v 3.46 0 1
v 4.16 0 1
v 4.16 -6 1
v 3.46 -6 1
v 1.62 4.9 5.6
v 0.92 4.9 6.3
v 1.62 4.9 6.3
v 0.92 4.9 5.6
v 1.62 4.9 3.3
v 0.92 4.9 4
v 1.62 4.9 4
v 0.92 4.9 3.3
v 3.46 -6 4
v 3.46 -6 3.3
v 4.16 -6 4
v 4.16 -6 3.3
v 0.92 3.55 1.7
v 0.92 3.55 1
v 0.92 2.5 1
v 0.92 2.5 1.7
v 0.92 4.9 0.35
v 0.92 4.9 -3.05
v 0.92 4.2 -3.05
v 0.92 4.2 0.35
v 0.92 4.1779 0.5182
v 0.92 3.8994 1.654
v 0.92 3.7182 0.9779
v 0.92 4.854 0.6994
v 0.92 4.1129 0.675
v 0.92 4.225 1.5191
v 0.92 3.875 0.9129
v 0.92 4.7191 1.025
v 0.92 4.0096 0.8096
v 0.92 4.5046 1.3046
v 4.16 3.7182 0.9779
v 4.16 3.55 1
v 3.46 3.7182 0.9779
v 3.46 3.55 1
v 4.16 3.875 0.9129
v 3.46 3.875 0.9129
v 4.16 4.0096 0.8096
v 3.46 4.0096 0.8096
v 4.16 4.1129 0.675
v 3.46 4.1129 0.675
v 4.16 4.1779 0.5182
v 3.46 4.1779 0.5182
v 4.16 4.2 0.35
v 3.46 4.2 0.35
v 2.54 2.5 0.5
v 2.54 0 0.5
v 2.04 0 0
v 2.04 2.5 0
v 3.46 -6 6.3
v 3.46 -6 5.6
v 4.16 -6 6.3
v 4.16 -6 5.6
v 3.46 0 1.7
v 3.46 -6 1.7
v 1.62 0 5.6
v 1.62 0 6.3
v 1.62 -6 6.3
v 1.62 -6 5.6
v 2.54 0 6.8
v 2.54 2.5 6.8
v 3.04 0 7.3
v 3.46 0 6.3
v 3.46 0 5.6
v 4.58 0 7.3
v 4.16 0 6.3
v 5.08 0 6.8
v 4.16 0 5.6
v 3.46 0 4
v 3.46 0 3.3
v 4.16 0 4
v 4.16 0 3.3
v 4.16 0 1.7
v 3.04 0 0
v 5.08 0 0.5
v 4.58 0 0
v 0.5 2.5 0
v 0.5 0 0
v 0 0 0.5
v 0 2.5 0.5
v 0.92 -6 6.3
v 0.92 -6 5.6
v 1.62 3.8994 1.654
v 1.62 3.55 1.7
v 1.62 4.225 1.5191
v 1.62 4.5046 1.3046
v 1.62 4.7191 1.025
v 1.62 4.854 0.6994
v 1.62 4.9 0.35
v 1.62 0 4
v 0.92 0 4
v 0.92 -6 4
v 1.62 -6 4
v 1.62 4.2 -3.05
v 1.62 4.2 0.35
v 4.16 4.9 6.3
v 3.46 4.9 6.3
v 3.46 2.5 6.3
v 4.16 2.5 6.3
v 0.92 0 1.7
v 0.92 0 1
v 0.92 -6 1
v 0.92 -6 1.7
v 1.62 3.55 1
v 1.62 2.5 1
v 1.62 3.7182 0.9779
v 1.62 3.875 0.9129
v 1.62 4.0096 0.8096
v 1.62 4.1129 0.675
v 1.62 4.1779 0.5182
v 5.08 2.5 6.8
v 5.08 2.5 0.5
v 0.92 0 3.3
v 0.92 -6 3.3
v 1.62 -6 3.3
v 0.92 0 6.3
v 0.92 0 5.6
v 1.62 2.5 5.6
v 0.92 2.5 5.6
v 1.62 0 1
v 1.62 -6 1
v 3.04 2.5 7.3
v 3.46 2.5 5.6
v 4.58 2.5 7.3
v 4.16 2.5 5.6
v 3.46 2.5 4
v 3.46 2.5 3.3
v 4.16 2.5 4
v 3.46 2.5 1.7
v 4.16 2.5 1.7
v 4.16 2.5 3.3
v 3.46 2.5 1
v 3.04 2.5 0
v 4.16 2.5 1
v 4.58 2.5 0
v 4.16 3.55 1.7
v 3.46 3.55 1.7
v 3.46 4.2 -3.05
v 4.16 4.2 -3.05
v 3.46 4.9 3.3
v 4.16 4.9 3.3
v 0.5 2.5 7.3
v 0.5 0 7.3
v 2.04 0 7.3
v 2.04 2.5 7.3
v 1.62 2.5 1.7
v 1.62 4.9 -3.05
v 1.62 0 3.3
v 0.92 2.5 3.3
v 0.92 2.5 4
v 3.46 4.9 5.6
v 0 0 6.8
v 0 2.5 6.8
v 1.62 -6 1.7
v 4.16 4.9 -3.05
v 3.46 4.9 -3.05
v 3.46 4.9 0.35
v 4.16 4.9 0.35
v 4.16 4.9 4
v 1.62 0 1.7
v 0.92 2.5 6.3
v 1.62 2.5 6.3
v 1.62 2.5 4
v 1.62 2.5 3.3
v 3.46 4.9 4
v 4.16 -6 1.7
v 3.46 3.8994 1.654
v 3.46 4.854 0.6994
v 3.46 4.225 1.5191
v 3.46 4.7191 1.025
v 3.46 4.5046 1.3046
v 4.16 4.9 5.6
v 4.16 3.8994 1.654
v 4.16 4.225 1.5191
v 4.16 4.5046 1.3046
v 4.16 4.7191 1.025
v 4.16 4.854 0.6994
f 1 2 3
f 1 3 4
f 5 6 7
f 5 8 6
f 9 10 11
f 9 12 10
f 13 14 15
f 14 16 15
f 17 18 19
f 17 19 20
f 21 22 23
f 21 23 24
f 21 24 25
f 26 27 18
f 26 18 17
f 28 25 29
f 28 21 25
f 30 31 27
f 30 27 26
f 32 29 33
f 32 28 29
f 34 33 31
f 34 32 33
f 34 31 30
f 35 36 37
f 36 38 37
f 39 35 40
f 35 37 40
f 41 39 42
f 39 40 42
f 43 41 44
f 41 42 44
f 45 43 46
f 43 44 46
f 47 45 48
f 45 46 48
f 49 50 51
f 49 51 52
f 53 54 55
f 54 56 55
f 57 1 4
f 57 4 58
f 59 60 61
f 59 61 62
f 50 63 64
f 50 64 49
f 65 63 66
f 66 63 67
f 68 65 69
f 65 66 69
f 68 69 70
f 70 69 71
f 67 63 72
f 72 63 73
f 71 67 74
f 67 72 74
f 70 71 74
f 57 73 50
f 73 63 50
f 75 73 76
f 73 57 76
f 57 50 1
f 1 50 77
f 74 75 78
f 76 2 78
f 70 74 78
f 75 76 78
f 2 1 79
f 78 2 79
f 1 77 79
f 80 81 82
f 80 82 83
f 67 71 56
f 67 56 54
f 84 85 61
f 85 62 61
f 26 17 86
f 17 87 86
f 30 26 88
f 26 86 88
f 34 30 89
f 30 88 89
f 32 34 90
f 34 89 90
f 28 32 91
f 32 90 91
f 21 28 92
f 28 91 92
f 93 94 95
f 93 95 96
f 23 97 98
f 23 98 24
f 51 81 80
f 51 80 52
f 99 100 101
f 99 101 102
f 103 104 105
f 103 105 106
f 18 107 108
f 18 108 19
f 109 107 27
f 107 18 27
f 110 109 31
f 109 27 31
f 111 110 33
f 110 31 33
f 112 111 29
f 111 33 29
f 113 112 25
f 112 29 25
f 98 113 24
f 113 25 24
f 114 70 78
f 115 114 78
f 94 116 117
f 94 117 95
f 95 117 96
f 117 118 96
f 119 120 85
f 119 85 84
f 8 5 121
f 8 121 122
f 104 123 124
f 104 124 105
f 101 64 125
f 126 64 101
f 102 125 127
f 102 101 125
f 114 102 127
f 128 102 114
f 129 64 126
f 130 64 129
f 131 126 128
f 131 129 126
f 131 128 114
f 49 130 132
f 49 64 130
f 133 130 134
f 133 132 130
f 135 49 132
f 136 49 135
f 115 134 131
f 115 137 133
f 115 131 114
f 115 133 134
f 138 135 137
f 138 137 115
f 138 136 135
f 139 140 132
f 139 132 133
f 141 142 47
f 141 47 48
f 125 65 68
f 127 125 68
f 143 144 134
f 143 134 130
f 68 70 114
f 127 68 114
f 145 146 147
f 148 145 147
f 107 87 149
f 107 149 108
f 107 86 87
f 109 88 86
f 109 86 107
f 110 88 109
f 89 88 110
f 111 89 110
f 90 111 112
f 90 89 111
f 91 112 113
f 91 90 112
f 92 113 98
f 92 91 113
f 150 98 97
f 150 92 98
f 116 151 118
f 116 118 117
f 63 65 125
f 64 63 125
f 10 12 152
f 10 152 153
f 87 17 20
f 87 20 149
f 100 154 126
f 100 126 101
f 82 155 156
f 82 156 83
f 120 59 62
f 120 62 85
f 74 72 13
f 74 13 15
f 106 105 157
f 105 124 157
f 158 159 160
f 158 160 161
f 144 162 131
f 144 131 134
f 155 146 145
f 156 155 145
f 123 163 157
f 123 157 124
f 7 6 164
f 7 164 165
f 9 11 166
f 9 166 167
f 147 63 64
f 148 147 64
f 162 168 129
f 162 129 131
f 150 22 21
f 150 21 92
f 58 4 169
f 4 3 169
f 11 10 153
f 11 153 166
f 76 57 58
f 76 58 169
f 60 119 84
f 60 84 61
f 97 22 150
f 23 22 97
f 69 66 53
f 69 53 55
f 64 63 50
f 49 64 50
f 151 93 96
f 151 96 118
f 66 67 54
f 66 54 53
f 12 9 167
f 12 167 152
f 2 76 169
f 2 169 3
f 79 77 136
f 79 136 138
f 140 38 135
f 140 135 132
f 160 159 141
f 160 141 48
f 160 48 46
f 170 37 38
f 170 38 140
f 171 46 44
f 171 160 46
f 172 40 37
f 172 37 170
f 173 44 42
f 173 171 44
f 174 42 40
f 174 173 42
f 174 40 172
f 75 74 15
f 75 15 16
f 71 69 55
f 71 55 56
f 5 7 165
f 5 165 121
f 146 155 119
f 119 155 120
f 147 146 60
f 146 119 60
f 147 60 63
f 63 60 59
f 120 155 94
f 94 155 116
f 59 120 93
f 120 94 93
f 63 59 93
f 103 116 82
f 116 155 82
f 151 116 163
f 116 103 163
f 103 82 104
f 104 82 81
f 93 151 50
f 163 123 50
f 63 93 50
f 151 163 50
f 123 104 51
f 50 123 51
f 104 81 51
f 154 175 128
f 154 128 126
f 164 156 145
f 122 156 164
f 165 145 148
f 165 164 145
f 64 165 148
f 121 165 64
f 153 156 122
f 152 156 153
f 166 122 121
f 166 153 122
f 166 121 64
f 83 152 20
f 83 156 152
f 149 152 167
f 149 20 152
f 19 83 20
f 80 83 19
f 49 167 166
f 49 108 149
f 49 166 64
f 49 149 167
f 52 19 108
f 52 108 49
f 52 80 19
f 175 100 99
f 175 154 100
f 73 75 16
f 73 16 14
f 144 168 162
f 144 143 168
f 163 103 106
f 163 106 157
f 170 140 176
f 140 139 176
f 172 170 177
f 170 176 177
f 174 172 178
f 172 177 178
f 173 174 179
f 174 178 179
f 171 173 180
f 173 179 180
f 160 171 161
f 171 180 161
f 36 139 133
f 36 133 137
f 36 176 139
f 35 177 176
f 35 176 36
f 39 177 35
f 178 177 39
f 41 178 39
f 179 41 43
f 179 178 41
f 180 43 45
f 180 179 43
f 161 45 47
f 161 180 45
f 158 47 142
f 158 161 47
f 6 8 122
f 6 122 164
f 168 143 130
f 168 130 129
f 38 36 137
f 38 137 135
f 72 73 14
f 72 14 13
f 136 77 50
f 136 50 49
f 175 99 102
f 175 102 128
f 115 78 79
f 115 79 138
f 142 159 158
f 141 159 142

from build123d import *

# Parameters (mm, degrees)
SKETCH1_W           = 0.7
SKETCH1_H           = 0.7
SKETCH1_5_W         = 0.7
SKETCH1_5_H         = 0.7
SKETCH1_6_W         = 0.7
SKETCH1_6_H         = 0.7
SKETCH1_7_W         = 2.54
SKETCH1_7_H         = 7.3
SKETCH1_7_W_2       = 0.7
SKETCH1_7_H_2       = 0.7
BOSS_EXTRUDE1_DEPTH = 2.5
CHAMFER1_SIZE       = 0.5
LPATTERN1_COUNT     = 2
LPATTERN1_PITCH     = 2.54
SKETCH3_W           = 5.08
SKETCH3_H           = 10.35
CUT_EXTRUDE1_DEPTH  = 5.6


with BuildPart() as part:
    # Sweep3: sweep along a path in Sketch2
    with BuildLine(Plane(origin=(1.25, 0, 0), x_dir=(0, 0, -1), z_dir=(1, 0, 0))) as sweep3_path:
        Line((-5.95, -6), (-5.95, 8.15))
        ThreePointArc((-5.95, 8.15), (-5.657106781, 8.857106781), (-4.95, 9.15))
        Line((-4.95, 9.15), (3.05, 9.15))
    # Sketch1 → Sweep3 (sweep)
    with BuildSketch(Plane(origin=(0, 0, 0), x_dir=(1, 0, 0), z_dir=(0, 1, 0))):
        with Locations((1.27, -5.95)):
            Rectangle(SKETCH1_W, SKETCH1_H)
    sweep(path=sweep3_path.line)



with BuildPart() as body_2:
    # Sweep4: sweep along a path in Sketch2<6>
    with BuildLine(Plane(origin=(1.25, 0, 0), x_dir=(0, 0, -1), z_dir=(1, 0, 0))) as sweep4_path:
        Line((-3.65, -6), (-3.65, 5.85))
        ThreePointArc((-3.65, 5.85), (-3.357106781, 6.557106781), (-2.65, 6.85))
        Line((-2.65, 6.85), (3.05, 6.85))
    # Sketch1<5> → Sweep4 (sweep)
    with BuildSketch(Plane(origin=(0, 0, 0), x_dir=(1, 0, 0), z_dir=(0, 1, 0))):
        with Locations((1.27, -3.65)):
            Rectangle(SKETCH1_5_W, SKETCH1_5_H)
    sweep(path=sweep4_path.line)


with BuildPart() as body_3:
    # Sweep5: sweep along a path in Sketch2<7>
    with BuildLine(Plane(origin=(1.25, 0, 0), x_dir=(0, 0, -1), z_dir=(1, 0, 0))) as sweep5_path:
        Line((-1.35, -6), (-1.35, 3.55))
        ThreePointArc((-1.35, 3.55), (-1.057106781, 4.257106781), (-0.35, 4.55))
        Line((-0.35, 4.55), (3.05, 4.55))
    # Sketch1<6> → Sweep5 (sweep)
    with BuildSketch(Plane(origin=(0, 0, 0), x_dir=(1, 0, 0), z_dir=(0, 1, 0))):
        with Locations((1.27, -1.35)):
            Rectangle(SKETCH1_6_W, SKETCH1_6_H)
    sweep(path=sweep5_path.line)


with BuildPart() as part_1:
    add(part.part)

    add(body_2.part)  # Boss-Extrude1 merges body 2

    add(body_3.part)  # Boss-Extrude1 merges body 3
    # Sketch1<7> → Boss-Extrude1 (add)
    with BuildSketch(Plane(origin=(0, 0, 0), x_dir=(1, 0, 0), z_dir=(0, 1, 0))):
        with Locations((1.27, -3.65)):
            Rectangle(SKETCH1_7_W, SKETCH1_7_H)
        with Locations((1.27, -1.35)):
            Rectangle(SKETCH1_7_W_2, SKETCH1_7_H_2, mode=Mode.SUBTRACT)
        with Locations((1.27, -5.95)):
            Rectangle(SKETCH1_7_W_2, SKETCH1_7_H_2, mode=Mode.SUBTRACT)
        with Locations((1.27, -3.65)):
            Rectangle(SKETCH1_7_W_2, SKETCH1_7_H_2, mode=Mode.SUBTRACT)
    extrude(amount=BOSS_EXTRUDE1_DEPTH)

    # Chamfer1
    chamfer1_edges = [part_1.edges().sort_by_distance(p)[0] for p in [
        (2.54, 1.25, 7.3),
        (2.54, 1.25, 0),
        (0, 1.25, 0),
        (0, 1.25, 7.3),
    ]]
    chamfer(chamfer1_edges, length=CHAMFER1_SIZE)


with BuildPart() as lpattern1_1:
    # LPattern1: pattern copy
    add(part_1.part.moved(Location(Vector(1, 0, 0) * (1 * LPATTERN1_PITCH))))


with BuildPart() as cut_extrude1_tool:
    # Sketch3 → Cut-Extrude1 (new body, through all)
    with BuildSketch(Plane(origin=(0, 4.9, 0), x_dir=(1, 0, 0), z_dir=(0, 1, 0))):
        with Locations((2.54, -2.125)):
            Rectangle(SKETCH3_W, SKETCH3_H)
    extrude(amount=CUT_EXTRUDE1_DEPTH)


with BuildPart() as part_2:
    add(part_1.part)

    # Cut-Extrude1: cut by cut_extrude1_tool
    add(cut_extrude1_tool.part, mode=Mode.SUBTRACT)


with BuildPart() as lpattern1_1_1:
    add(lpattern1_1.part)

    # Cut-Extrude1: cut by cut_extrude1_tool
    add(cut_extrude1_tool.part, mode=Mode.SUBTRACT)


solid = Compound([part_2.part, lpattern1_1_1.part])
